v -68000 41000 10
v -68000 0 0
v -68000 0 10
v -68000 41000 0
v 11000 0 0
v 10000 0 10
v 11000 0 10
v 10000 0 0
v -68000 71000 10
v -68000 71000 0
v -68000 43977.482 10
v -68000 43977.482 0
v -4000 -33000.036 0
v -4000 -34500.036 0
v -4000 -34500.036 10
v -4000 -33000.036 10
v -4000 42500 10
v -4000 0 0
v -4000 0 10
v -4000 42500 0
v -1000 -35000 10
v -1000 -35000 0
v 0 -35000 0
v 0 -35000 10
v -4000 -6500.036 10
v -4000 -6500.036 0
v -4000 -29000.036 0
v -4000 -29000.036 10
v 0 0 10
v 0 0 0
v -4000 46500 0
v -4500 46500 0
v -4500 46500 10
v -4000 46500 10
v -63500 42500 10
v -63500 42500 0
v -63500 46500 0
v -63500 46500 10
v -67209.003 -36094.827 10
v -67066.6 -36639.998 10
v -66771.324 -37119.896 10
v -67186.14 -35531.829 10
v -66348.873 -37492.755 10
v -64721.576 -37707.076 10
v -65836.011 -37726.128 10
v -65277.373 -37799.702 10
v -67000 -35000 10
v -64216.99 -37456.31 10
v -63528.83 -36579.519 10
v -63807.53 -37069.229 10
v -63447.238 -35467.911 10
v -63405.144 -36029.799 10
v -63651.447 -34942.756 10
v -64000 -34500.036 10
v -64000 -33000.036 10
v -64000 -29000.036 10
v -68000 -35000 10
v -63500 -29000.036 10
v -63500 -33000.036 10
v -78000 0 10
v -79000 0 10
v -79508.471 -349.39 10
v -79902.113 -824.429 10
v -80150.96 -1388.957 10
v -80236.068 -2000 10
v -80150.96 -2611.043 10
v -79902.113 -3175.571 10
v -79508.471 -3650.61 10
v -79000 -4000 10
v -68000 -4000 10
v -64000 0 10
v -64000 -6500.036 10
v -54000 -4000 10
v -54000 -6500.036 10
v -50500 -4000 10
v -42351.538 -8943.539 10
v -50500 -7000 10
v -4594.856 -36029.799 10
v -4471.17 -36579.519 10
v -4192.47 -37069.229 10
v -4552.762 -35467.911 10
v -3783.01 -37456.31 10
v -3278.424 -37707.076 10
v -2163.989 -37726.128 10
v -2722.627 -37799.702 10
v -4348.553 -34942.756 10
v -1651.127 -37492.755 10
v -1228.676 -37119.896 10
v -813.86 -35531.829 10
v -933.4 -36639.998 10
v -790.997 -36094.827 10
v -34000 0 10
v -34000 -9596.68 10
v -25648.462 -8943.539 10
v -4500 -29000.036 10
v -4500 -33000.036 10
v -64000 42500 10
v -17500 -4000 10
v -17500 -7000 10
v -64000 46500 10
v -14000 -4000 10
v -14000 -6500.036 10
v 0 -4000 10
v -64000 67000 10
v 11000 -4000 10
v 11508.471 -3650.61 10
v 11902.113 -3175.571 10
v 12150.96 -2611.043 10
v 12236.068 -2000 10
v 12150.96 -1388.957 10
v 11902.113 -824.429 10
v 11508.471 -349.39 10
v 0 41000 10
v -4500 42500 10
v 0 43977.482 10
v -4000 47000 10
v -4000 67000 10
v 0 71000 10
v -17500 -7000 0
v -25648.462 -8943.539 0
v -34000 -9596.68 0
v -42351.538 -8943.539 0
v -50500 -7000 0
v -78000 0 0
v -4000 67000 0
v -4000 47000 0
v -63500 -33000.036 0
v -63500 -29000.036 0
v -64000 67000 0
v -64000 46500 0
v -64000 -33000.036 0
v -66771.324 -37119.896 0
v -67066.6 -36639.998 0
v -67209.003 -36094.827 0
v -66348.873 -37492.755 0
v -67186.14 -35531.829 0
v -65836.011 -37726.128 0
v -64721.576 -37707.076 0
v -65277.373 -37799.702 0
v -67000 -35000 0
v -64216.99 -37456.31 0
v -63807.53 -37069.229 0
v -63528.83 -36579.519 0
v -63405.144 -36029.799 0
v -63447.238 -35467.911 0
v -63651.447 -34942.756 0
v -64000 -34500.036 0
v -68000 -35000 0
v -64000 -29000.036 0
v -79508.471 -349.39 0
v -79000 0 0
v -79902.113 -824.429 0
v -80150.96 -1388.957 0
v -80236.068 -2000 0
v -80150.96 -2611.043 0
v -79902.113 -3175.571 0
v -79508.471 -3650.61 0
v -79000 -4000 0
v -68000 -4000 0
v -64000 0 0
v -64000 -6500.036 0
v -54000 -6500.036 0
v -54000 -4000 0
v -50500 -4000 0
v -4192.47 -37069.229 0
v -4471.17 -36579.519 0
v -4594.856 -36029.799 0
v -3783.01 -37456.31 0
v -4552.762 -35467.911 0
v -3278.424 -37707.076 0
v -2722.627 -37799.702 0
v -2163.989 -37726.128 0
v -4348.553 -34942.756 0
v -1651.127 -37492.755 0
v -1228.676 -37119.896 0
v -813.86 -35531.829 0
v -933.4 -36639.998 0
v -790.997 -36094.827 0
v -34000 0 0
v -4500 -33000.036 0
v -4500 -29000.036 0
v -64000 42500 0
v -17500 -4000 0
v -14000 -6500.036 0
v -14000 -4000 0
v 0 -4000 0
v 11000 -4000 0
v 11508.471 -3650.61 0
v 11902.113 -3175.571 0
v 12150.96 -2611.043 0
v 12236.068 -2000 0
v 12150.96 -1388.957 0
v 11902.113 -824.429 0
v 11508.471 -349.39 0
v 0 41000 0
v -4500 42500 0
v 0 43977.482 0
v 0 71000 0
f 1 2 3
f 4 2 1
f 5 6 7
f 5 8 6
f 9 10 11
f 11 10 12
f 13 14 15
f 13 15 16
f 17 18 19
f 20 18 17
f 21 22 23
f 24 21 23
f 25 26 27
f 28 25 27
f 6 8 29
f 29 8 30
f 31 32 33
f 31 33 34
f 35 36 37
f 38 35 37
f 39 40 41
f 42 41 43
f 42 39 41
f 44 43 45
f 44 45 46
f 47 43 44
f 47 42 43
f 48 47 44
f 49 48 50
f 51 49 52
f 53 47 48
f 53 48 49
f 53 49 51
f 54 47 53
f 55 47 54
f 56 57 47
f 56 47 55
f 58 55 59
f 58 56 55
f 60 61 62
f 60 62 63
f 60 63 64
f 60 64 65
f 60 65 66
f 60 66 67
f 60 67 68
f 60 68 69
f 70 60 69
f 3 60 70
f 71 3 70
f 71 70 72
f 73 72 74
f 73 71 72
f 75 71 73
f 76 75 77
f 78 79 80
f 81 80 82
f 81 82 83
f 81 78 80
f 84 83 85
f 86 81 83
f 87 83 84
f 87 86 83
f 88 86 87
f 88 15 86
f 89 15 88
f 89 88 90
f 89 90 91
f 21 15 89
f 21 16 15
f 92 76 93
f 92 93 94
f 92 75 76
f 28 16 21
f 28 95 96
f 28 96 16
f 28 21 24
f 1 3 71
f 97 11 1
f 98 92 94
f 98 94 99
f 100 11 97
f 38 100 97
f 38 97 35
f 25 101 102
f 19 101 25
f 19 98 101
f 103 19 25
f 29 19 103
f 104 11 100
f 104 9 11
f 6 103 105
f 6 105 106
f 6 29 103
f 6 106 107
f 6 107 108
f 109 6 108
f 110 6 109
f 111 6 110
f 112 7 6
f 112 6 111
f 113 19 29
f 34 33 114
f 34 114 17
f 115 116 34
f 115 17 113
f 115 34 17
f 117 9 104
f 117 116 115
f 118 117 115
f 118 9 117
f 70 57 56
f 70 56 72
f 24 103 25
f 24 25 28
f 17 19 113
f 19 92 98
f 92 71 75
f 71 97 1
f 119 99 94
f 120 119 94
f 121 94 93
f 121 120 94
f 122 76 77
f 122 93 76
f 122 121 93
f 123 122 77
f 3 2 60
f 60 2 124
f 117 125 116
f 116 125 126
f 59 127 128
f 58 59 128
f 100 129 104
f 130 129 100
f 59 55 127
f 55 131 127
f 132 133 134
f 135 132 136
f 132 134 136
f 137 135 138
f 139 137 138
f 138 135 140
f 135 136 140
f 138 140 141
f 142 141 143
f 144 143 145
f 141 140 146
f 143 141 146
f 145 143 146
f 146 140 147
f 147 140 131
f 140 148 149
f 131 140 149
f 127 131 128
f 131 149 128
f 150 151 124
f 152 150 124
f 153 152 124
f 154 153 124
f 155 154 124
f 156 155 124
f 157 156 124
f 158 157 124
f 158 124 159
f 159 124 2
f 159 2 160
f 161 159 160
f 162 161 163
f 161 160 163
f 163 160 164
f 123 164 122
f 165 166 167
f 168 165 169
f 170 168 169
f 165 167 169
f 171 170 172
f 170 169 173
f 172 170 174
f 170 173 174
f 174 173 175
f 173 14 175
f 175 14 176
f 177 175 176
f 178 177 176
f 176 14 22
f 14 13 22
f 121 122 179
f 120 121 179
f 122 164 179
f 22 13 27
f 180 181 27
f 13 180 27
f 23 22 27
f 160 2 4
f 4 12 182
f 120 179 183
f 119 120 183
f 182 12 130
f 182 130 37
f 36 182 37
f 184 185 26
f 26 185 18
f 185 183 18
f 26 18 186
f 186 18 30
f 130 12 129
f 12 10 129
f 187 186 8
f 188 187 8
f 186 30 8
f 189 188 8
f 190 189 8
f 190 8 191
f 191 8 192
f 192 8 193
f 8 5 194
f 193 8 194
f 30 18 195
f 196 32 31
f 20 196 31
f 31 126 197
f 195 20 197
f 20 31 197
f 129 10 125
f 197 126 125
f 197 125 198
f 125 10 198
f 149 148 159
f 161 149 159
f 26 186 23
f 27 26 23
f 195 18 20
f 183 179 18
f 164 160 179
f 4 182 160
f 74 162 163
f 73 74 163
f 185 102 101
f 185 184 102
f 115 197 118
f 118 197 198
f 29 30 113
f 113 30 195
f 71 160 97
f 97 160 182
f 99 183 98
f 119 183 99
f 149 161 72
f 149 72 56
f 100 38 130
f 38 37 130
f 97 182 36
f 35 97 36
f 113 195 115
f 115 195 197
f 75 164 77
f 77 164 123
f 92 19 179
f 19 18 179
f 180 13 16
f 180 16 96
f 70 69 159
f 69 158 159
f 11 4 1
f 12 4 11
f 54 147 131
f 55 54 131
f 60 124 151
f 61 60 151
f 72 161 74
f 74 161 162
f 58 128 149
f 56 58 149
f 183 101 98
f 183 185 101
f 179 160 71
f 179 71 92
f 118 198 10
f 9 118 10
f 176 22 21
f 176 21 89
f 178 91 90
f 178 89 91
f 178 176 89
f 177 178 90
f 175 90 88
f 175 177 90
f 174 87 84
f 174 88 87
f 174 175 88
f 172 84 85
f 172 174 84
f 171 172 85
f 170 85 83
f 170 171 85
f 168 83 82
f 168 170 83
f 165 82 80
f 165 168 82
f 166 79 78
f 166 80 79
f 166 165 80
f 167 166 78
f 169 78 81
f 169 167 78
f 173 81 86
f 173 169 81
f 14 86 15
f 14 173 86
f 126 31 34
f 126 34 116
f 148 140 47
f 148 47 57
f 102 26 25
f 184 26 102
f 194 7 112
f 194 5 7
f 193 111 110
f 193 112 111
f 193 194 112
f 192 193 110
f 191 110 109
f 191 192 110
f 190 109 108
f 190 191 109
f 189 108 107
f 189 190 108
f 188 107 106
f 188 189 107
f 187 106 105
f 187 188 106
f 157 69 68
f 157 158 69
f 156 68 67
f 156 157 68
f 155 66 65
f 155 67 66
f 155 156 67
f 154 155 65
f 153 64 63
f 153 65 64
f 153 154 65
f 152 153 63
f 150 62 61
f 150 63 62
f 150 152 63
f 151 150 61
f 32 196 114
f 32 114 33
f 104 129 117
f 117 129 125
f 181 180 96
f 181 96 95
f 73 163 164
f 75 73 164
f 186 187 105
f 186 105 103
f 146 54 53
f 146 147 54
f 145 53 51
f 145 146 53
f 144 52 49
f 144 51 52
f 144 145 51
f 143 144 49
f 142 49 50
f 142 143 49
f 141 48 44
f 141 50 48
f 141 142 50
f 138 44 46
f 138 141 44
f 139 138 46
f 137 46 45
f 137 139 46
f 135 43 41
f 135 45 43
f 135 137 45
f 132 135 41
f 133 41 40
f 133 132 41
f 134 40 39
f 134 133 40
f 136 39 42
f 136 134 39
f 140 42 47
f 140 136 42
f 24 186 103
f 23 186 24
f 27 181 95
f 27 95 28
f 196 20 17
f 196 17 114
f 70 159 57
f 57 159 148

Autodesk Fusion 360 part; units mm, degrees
sketch "スケッチ1" plane through (0, 0, 0) normal (0, 0, 1) x (1, 0, 0)
  line L0 (10000, 0) -> (11000, 0)
  line L1 (11000, -4000) -> (0, -4000)
  line L2 (-63500, -29000.036) -> (-64000, -29000.036)
  line L3 (-63500, 42500) -> (-63500, 46500)
  line L4 (-54000, -6500.036) -> (-54000, -4000)
  line L5 (-64000, -34500.036) -> (-64000, -33000.036)
  line L6 (-34000, 2000) -> (-34000, -2000)
  arc A0 (-79000, 0) -> (-79000, -4000) centre (-78000, -2000) ccw
  line L7 (-67000, -35000) -> (-68000, -35000)
  line L8 (-64000, -6500.036) -> (-64000, -29000.036)
  line L9 (-64000, 0) -> (-34000, 0)
  line L10 (-64000, 42500) -> (-63500, 42500)
  line L11 (0, 41000) -> (0, 43977.4822)
  line L12 (-4500, -33000.036) -> (-4500, -29000.036)
  arc A1 (-67000, -35000) -> (-64000, -34500.036) centre (-65310.0198, -35889.9814) ccw
  arc A2 (11000, -4000) -> (11000, 0) centre (10000, -2000) ccw
  line L13 (-79000, -4000) -> (-68000, -4000)
  line L14 (-68000, 41000) -> (-68000, 43977.4822)
  line L15 (11000, -4000) -> (0, -4000)
  line L16 (-1000, -35000) -> (0, -35000)
  line L17 (-64000, 0) -> (-64000, 42500)
  line L18 (-78000, 0) -> (-79000, 0)
  line L19 (-68000, 0) -> (-78000, 0)
  line L20 (-4000, 0) -> (-4000, 42500)
  line L21 (-64000, -6500.036) -> (-54000, -6500.036)
  line L22 (-14000, -6500.036) -> (-14000, -4000)
  line L23 (-68000, 0) -> (-68000, 41000)
  line L24 (-63500, -33000.036) -> (-63500, -29000.036)
  line L25 (-4000, 0) -> (-34000, 0)
  line L26 (-4000, -6500.036) -> (-14000, -6500.036)
  line L27 (-4000, -33000.036) -> (-4500, -33000.036)
  line L28 (-4000, 42500) -> (-4500, 42500)
  line L29 (-68000, -4000) -> (-68000, -35000)
  line L30 (11000, 0) -> (0, 0)
  line L31 (-64000, -33000.036) -> (-63500, -33000.036)
  line L32 (0, -4000) -> (0, -35000)
  line L33 (-4500, 46500) -> (-4000, 46500)
  line L34 (0, 0) -> (10000, 0)
  line L35 (-63500, 46500) -> (-64000, 46500)
  line L36 (-4000, -34500.036) -> (-4000, -33000.036)
  line L37 (-4000, -6500.036) -> (-4000, -29000.036)
  line L38 (-4500, -29000.036) -> (-4000, -29000.036)
  line L39 (-4500, 42500) -> (-4500, 46500)
  arc A3 (-4000, -34500.036) -> (-1000, -35000) centre (-2689.9802, -35889.9814) ccw
  line L40 (0, 0) -> (0, 41000)
  line L41 (-54000, -4000) -> (-50500, -4000)
  line L42 (-50500, -4000) -> (-50500, -7000)
  line L43 (-14000, -4000) -> (-17500, -4000)
  line L44 (-17500, -4000) -> (-17500, -7000)
  arc A4 (-50500, -7000) -> (-17500, -7000) centre (-34000, 44124.3719) ccw
  line L45 (-68000, 71000) -> (-68000, 43977.4822)
  line L46 (-64000, 67000) -> (-4000, 67000)
  line L47 (0, 71000) -> (-68000, 71000)
  line L48 (0, 43977.4822) -> (0, 71000)
  line L49 (-4000, 67000) -> (-4000, 47000)
  line L50 (-4000, 46500) -> (-4000, 47000)
  line L51 (-64000, 67000) -> (-64000, 46500)
  point P0 (-64000, 42500)
  point P1 (-64000, -6500.036)
  point P2 (-64000, 0)
  point P3 (-64000, -34500.036)
  point P4 (-68000, 0)
  point P5 (-64000, -35000)
  point P6 (-4000, 0)
  point P7 (-64000, 41000)
  point P8 (-4000, -35000)
  point P9 (-4000, 41000)
  point P10 (-4000, -6500.036)
  point P11 (-64000, 0)
  point P12 (-4000, 42500)
  point P13 (-4000, -34500.036)
extrude "押し出し1" add sketch "スケッチ1" along normal blind 10
